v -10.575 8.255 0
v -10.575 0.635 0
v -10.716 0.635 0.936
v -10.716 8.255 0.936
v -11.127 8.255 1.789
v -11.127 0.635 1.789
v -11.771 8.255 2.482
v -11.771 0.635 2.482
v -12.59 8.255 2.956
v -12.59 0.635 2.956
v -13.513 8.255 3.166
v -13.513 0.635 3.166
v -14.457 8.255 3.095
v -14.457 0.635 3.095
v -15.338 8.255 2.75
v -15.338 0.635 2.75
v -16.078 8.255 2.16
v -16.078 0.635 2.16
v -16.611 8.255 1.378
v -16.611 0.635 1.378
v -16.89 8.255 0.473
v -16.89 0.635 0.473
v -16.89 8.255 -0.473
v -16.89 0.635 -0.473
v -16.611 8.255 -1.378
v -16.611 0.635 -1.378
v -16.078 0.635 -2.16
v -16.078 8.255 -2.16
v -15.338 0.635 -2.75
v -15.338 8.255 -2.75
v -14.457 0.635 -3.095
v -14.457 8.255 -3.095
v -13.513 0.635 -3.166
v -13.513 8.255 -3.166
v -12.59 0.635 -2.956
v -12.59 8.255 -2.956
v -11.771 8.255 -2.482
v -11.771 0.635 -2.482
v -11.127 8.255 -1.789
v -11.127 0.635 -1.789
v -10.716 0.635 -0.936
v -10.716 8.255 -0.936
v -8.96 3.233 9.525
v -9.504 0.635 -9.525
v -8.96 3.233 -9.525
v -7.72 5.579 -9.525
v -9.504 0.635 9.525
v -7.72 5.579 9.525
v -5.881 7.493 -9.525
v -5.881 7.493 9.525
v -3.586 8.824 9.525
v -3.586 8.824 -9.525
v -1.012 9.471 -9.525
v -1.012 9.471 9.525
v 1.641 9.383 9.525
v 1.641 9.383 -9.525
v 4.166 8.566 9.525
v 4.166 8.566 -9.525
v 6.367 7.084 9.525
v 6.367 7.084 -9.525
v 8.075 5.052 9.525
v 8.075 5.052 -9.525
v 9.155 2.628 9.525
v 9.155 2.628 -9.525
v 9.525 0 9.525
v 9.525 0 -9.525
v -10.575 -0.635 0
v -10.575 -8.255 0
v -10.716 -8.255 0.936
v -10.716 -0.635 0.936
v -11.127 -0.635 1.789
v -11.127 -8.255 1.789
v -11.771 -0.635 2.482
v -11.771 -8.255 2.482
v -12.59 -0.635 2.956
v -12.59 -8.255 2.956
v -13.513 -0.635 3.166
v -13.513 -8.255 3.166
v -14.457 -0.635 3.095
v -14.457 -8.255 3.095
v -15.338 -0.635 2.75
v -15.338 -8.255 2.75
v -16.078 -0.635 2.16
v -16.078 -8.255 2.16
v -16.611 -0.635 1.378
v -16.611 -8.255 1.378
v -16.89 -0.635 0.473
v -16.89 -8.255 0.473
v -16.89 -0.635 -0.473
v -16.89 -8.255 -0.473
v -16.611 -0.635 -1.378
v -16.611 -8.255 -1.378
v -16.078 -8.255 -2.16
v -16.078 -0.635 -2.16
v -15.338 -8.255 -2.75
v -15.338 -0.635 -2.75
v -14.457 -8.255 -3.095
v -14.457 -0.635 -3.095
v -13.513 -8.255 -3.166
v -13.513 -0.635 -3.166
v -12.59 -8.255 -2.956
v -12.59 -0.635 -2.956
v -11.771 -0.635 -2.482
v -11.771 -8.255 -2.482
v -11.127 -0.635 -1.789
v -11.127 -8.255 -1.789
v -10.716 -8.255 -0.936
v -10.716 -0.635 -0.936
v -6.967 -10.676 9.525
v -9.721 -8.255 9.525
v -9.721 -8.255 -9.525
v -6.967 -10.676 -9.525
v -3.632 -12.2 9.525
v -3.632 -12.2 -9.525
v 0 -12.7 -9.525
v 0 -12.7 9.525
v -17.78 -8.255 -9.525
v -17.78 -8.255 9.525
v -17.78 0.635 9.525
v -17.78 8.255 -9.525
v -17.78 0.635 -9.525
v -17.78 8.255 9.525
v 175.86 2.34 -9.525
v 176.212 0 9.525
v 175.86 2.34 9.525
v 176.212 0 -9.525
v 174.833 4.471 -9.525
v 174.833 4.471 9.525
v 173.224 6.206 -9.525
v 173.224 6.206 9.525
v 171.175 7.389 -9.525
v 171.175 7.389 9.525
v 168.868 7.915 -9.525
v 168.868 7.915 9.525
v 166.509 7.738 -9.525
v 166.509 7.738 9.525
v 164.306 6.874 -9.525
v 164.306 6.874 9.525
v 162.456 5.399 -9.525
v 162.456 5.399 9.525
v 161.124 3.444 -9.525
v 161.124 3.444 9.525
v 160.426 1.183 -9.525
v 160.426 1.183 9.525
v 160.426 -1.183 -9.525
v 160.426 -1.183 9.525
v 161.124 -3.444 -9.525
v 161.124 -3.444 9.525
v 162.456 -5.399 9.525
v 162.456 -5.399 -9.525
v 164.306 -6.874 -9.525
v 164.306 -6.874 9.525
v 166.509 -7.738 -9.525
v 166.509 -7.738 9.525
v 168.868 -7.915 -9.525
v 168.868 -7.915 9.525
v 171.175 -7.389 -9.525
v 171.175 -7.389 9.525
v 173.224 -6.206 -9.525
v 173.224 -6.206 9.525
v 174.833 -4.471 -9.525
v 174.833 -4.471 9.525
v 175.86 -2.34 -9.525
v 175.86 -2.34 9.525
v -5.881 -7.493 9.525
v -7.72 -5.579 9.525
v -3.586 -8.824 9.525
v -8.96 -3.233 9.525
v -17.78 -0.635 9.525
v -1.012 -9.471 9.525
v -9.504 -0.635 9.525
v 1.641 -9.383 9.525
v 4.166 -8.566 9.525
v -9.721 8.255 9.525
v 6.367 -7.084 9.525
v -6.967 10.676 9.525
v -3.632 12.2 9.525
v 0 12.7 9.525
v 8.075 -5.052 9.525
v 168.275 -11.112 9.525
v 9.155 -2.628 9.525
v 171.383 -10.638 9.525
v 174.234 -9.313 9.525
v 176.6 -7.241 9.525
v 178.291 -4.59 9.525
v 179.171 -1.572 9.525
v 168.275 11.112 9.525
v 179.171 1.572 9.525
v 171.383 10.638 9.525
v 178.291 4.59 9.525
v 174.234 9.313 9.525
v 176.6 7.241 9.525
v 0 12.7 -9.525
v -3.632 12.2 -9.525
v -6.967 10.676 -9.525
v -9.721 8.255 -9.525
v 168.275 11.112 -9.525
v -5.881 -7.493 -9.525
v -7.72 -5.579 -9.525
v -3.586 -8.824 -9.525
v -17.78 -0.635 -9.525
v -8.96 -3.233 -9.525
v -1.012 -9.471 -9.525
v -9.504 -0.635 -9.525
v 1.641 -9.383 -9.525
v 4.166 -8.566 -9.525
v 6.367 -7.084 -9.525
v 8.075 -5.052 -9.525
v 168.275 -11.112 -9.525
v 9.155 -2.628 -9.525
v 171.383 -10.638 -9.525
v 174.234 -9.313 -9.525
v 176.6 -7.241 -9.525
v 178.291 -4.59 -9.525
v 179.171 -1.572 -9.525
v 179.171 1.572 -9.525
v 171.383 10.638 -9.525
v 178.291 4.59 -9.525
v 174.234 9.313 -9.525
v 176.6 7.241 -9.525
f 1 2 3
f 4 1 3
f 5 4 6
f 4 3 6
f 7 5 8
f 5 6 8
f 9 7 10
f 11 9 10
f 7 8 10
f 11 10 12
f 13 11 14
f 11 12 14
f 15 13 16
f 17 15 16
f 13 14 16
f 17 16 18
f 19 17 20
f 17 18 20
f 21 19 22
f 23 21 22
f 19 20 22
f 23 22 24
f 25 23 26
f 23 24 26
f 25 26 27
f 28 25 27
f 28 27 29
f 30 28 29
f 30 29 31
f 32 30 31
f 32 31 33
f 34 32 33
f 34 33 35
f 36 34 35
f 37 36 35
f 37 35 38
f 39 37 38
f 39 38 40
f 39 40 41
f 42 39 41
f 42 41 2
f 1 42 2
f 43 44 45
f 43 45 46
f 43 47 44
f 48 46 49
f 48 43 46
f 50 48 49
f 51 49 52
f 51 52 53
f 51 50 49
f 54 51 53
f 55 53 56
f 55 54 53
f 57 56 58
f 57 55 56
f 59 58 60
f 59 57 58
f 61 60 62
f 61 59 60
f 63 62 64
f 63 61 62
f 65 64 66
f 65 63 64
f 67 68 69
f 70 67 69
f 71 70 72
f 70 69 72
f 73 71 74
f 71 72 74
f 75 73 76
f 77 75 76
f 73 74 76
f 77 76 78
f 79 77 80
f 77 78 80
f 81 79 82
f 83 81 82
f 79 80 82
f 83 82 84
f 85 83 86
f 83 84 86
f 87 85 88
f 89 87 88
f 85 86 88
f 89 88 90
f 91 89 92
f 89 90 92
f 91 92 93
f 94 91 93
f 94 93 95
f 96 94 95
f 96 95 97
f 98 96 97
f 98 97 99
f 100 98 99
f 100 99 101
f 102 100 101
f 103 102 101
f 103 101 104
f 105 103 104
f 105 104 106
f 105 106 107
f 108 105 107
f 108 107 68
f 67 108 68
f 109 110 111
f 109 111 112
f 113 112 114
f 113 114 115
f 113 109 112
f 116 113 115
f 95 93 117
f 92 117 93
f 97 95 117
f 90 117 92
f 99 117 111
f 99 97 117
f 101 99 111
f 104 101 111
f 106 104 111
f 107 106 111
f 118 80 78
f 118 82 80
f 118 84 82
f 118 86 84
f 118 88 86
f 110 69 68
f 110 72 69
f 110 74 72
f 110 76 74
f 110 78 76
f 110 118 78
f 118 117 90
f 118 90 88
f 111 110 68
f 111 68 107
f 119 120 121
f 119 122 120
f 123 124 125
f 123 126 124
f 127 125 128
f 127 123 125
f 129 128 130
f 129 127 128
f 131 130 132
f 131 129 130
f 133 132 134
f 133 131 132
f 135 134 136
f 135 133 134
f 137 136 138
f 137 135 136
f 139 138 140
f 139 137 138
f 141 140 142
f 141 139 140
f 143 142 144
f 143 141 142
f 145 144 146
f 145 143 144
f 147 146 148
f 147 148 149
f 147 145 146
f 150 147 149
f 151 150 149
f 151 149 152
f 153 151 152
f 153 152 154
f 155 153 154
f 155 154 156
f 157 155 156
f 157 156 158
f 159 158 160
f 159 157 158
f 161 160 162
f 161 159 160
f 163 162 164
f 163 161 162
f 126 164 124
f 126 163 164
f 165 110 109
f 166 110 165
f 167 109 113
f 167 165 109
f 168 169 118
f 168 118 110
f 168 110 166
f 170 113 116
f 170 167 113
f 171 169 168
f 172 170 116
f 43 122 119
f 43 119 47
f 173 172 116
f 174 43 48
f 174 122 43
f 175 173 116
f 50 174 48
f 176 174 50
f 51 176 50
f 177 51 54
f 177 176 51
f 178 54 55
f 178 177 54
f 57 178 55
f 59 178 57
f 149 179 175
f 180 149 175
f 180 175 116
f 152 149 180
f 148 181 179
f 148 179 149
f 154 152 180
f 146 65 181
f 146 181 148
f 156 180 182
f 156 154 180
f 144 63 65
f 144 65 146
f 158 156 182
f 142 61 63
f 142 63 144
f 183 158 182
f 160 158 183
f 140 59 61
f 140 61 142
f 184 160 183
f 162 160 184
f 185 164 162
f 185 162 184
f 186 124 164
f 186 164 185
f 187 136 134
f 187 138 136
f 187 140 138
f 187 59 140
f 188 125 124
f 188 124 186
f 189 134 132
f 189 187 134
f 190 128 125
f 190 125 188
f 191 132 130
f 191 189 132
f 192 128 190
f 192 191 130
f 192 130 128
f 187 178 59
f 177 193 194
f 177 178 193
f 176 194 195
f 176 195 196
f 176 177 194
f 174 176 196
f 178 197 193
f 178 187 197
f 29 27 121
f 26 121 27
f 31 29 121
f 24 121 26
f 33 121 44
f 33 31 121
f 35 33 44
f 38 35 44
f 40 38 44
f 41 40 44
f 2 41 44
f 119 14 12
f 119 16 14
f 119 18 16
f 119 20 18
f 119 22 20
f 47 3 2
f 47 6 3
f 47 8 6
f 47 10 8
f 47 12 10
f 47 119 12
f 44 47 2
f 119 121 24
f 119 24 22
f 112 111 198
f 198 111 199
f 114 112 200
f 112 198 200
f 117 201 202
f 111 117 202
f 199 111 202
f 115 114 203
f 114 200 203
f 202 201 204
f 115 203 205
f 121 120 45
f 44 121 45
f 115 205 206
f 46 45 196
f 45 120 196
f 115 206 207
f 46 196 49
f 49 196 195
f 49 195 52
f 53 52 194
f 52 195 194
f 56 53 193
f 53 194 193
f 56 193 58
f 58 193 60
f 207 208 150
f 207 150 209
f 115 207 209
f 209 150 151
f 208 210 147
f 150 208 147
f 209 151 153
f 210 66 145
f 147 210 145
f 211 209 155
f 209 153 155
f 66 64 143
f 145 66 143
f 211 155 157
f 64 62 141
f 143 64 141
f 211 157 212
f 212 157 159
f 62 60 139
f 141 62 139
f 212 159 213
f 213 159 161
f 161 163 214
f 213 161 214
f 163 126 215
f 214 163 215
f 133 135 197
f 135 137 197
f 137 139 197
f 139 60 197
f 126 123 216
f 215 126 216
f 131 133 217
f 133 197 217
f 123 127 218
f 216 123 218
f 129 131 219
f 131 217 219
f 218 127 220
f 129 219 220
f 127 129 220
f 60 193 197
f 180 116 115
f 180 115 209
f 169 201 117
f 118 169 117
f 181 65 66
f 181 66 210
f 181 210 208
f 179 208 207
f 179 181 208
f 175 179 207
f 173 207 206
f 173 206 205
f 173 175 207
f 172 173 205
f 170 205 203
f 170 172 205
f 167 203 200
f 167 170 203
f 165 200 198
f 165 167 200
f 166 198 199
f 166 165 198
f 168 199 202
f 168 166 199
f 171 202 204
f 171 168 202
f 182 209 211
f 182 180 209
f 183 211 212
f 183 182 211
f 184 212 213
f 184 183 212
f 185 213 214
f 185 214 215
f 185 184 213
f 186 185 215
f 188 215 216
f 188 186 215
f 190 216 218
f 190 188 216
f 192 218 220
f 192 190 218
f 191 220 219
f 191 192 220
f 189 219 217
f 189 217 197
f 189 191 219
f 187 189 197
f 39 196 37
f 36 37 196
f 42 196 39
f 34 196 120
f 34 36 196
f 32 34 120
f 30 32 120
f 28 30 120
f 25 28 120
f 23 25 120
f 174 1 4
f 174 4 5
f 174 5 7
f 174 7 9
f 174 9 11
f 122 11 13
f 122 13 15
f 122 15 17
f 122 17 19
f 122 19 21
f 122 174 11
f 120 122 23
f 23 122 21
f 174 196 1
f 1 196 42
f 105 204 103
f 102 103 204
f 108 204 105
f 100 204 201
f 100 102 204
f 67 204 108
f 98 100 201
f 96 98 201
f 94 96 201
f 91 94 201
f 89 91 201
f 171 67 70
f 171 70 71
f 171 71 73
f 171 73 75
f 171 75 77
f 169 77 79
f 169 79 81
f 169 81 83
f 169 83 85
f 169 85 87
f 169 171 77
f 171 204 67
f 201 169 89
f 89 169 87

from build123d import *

# Parameters (mm, degrees)
F0_R     = 7.9375
F1_DEPTH = 9.525
F3_D     = 6.35


with BuildPart() as f1:
    # F0 (on Top) → F1 (new body, symmetric)
    with BuildSketch(Plane.XY):
        with BuildLine():
            ThreePointArc((-9.50381, 0.635), (0.317677, 9.519701), (9.525, 0))
            ThreePointArc((9.525, 0), (0.317677, -9.519701), (-9.50381, -0.635))
            Line((-9.50381, -0.635), (-12.7, -0.635))
            Line((-12.7, -0.635), (-17.78, -0.635))
            Line((-17.78, -0.635), (-17.78, -8.255))
            Line((-17.78, -8.255), (-9.720665, -8.255))
            ThreePointArc((-9.720665, -8.255), (-5.355366, -11.560078), (0, -12.7))
            Line((0, -12.7), (168.275, -11.1125))
            ThreePointArc((168.275, -11.1125), (179.28316, 0), (168.275, 11.1125))
            Line((168.275, 11.1125), (0, 12.7))
            ThreePointArc((0, 12.7), (-5.355366, 11.560078), (-9.720665, 8.255))
            Line((-9.720665, 8.255), (-17.78, 8.255))
            Line((-17.78, 8.255), (-17.78, 0.635))
            Line((-17.78, 0.635), (-12.7, 0.635))
            Line((-12.7, 0.635), (-9.50381, 0.635))
        make_face()
        with Locations((168.275, 0)):
            Circle(F0_R, mode=Mode.SUBTRACT)
    extrude(amount=F1_DEPTH, both=True)

    # F3 (through all)
    with Locations(Plane(origin=(0, 8.255, 0), x_dir=(-1, 0, 0), z_dir=(0, 1, 0))):
        with Locations((13.750333, 0)):
            Hole(F3_D / 2)


solid = f1.part
